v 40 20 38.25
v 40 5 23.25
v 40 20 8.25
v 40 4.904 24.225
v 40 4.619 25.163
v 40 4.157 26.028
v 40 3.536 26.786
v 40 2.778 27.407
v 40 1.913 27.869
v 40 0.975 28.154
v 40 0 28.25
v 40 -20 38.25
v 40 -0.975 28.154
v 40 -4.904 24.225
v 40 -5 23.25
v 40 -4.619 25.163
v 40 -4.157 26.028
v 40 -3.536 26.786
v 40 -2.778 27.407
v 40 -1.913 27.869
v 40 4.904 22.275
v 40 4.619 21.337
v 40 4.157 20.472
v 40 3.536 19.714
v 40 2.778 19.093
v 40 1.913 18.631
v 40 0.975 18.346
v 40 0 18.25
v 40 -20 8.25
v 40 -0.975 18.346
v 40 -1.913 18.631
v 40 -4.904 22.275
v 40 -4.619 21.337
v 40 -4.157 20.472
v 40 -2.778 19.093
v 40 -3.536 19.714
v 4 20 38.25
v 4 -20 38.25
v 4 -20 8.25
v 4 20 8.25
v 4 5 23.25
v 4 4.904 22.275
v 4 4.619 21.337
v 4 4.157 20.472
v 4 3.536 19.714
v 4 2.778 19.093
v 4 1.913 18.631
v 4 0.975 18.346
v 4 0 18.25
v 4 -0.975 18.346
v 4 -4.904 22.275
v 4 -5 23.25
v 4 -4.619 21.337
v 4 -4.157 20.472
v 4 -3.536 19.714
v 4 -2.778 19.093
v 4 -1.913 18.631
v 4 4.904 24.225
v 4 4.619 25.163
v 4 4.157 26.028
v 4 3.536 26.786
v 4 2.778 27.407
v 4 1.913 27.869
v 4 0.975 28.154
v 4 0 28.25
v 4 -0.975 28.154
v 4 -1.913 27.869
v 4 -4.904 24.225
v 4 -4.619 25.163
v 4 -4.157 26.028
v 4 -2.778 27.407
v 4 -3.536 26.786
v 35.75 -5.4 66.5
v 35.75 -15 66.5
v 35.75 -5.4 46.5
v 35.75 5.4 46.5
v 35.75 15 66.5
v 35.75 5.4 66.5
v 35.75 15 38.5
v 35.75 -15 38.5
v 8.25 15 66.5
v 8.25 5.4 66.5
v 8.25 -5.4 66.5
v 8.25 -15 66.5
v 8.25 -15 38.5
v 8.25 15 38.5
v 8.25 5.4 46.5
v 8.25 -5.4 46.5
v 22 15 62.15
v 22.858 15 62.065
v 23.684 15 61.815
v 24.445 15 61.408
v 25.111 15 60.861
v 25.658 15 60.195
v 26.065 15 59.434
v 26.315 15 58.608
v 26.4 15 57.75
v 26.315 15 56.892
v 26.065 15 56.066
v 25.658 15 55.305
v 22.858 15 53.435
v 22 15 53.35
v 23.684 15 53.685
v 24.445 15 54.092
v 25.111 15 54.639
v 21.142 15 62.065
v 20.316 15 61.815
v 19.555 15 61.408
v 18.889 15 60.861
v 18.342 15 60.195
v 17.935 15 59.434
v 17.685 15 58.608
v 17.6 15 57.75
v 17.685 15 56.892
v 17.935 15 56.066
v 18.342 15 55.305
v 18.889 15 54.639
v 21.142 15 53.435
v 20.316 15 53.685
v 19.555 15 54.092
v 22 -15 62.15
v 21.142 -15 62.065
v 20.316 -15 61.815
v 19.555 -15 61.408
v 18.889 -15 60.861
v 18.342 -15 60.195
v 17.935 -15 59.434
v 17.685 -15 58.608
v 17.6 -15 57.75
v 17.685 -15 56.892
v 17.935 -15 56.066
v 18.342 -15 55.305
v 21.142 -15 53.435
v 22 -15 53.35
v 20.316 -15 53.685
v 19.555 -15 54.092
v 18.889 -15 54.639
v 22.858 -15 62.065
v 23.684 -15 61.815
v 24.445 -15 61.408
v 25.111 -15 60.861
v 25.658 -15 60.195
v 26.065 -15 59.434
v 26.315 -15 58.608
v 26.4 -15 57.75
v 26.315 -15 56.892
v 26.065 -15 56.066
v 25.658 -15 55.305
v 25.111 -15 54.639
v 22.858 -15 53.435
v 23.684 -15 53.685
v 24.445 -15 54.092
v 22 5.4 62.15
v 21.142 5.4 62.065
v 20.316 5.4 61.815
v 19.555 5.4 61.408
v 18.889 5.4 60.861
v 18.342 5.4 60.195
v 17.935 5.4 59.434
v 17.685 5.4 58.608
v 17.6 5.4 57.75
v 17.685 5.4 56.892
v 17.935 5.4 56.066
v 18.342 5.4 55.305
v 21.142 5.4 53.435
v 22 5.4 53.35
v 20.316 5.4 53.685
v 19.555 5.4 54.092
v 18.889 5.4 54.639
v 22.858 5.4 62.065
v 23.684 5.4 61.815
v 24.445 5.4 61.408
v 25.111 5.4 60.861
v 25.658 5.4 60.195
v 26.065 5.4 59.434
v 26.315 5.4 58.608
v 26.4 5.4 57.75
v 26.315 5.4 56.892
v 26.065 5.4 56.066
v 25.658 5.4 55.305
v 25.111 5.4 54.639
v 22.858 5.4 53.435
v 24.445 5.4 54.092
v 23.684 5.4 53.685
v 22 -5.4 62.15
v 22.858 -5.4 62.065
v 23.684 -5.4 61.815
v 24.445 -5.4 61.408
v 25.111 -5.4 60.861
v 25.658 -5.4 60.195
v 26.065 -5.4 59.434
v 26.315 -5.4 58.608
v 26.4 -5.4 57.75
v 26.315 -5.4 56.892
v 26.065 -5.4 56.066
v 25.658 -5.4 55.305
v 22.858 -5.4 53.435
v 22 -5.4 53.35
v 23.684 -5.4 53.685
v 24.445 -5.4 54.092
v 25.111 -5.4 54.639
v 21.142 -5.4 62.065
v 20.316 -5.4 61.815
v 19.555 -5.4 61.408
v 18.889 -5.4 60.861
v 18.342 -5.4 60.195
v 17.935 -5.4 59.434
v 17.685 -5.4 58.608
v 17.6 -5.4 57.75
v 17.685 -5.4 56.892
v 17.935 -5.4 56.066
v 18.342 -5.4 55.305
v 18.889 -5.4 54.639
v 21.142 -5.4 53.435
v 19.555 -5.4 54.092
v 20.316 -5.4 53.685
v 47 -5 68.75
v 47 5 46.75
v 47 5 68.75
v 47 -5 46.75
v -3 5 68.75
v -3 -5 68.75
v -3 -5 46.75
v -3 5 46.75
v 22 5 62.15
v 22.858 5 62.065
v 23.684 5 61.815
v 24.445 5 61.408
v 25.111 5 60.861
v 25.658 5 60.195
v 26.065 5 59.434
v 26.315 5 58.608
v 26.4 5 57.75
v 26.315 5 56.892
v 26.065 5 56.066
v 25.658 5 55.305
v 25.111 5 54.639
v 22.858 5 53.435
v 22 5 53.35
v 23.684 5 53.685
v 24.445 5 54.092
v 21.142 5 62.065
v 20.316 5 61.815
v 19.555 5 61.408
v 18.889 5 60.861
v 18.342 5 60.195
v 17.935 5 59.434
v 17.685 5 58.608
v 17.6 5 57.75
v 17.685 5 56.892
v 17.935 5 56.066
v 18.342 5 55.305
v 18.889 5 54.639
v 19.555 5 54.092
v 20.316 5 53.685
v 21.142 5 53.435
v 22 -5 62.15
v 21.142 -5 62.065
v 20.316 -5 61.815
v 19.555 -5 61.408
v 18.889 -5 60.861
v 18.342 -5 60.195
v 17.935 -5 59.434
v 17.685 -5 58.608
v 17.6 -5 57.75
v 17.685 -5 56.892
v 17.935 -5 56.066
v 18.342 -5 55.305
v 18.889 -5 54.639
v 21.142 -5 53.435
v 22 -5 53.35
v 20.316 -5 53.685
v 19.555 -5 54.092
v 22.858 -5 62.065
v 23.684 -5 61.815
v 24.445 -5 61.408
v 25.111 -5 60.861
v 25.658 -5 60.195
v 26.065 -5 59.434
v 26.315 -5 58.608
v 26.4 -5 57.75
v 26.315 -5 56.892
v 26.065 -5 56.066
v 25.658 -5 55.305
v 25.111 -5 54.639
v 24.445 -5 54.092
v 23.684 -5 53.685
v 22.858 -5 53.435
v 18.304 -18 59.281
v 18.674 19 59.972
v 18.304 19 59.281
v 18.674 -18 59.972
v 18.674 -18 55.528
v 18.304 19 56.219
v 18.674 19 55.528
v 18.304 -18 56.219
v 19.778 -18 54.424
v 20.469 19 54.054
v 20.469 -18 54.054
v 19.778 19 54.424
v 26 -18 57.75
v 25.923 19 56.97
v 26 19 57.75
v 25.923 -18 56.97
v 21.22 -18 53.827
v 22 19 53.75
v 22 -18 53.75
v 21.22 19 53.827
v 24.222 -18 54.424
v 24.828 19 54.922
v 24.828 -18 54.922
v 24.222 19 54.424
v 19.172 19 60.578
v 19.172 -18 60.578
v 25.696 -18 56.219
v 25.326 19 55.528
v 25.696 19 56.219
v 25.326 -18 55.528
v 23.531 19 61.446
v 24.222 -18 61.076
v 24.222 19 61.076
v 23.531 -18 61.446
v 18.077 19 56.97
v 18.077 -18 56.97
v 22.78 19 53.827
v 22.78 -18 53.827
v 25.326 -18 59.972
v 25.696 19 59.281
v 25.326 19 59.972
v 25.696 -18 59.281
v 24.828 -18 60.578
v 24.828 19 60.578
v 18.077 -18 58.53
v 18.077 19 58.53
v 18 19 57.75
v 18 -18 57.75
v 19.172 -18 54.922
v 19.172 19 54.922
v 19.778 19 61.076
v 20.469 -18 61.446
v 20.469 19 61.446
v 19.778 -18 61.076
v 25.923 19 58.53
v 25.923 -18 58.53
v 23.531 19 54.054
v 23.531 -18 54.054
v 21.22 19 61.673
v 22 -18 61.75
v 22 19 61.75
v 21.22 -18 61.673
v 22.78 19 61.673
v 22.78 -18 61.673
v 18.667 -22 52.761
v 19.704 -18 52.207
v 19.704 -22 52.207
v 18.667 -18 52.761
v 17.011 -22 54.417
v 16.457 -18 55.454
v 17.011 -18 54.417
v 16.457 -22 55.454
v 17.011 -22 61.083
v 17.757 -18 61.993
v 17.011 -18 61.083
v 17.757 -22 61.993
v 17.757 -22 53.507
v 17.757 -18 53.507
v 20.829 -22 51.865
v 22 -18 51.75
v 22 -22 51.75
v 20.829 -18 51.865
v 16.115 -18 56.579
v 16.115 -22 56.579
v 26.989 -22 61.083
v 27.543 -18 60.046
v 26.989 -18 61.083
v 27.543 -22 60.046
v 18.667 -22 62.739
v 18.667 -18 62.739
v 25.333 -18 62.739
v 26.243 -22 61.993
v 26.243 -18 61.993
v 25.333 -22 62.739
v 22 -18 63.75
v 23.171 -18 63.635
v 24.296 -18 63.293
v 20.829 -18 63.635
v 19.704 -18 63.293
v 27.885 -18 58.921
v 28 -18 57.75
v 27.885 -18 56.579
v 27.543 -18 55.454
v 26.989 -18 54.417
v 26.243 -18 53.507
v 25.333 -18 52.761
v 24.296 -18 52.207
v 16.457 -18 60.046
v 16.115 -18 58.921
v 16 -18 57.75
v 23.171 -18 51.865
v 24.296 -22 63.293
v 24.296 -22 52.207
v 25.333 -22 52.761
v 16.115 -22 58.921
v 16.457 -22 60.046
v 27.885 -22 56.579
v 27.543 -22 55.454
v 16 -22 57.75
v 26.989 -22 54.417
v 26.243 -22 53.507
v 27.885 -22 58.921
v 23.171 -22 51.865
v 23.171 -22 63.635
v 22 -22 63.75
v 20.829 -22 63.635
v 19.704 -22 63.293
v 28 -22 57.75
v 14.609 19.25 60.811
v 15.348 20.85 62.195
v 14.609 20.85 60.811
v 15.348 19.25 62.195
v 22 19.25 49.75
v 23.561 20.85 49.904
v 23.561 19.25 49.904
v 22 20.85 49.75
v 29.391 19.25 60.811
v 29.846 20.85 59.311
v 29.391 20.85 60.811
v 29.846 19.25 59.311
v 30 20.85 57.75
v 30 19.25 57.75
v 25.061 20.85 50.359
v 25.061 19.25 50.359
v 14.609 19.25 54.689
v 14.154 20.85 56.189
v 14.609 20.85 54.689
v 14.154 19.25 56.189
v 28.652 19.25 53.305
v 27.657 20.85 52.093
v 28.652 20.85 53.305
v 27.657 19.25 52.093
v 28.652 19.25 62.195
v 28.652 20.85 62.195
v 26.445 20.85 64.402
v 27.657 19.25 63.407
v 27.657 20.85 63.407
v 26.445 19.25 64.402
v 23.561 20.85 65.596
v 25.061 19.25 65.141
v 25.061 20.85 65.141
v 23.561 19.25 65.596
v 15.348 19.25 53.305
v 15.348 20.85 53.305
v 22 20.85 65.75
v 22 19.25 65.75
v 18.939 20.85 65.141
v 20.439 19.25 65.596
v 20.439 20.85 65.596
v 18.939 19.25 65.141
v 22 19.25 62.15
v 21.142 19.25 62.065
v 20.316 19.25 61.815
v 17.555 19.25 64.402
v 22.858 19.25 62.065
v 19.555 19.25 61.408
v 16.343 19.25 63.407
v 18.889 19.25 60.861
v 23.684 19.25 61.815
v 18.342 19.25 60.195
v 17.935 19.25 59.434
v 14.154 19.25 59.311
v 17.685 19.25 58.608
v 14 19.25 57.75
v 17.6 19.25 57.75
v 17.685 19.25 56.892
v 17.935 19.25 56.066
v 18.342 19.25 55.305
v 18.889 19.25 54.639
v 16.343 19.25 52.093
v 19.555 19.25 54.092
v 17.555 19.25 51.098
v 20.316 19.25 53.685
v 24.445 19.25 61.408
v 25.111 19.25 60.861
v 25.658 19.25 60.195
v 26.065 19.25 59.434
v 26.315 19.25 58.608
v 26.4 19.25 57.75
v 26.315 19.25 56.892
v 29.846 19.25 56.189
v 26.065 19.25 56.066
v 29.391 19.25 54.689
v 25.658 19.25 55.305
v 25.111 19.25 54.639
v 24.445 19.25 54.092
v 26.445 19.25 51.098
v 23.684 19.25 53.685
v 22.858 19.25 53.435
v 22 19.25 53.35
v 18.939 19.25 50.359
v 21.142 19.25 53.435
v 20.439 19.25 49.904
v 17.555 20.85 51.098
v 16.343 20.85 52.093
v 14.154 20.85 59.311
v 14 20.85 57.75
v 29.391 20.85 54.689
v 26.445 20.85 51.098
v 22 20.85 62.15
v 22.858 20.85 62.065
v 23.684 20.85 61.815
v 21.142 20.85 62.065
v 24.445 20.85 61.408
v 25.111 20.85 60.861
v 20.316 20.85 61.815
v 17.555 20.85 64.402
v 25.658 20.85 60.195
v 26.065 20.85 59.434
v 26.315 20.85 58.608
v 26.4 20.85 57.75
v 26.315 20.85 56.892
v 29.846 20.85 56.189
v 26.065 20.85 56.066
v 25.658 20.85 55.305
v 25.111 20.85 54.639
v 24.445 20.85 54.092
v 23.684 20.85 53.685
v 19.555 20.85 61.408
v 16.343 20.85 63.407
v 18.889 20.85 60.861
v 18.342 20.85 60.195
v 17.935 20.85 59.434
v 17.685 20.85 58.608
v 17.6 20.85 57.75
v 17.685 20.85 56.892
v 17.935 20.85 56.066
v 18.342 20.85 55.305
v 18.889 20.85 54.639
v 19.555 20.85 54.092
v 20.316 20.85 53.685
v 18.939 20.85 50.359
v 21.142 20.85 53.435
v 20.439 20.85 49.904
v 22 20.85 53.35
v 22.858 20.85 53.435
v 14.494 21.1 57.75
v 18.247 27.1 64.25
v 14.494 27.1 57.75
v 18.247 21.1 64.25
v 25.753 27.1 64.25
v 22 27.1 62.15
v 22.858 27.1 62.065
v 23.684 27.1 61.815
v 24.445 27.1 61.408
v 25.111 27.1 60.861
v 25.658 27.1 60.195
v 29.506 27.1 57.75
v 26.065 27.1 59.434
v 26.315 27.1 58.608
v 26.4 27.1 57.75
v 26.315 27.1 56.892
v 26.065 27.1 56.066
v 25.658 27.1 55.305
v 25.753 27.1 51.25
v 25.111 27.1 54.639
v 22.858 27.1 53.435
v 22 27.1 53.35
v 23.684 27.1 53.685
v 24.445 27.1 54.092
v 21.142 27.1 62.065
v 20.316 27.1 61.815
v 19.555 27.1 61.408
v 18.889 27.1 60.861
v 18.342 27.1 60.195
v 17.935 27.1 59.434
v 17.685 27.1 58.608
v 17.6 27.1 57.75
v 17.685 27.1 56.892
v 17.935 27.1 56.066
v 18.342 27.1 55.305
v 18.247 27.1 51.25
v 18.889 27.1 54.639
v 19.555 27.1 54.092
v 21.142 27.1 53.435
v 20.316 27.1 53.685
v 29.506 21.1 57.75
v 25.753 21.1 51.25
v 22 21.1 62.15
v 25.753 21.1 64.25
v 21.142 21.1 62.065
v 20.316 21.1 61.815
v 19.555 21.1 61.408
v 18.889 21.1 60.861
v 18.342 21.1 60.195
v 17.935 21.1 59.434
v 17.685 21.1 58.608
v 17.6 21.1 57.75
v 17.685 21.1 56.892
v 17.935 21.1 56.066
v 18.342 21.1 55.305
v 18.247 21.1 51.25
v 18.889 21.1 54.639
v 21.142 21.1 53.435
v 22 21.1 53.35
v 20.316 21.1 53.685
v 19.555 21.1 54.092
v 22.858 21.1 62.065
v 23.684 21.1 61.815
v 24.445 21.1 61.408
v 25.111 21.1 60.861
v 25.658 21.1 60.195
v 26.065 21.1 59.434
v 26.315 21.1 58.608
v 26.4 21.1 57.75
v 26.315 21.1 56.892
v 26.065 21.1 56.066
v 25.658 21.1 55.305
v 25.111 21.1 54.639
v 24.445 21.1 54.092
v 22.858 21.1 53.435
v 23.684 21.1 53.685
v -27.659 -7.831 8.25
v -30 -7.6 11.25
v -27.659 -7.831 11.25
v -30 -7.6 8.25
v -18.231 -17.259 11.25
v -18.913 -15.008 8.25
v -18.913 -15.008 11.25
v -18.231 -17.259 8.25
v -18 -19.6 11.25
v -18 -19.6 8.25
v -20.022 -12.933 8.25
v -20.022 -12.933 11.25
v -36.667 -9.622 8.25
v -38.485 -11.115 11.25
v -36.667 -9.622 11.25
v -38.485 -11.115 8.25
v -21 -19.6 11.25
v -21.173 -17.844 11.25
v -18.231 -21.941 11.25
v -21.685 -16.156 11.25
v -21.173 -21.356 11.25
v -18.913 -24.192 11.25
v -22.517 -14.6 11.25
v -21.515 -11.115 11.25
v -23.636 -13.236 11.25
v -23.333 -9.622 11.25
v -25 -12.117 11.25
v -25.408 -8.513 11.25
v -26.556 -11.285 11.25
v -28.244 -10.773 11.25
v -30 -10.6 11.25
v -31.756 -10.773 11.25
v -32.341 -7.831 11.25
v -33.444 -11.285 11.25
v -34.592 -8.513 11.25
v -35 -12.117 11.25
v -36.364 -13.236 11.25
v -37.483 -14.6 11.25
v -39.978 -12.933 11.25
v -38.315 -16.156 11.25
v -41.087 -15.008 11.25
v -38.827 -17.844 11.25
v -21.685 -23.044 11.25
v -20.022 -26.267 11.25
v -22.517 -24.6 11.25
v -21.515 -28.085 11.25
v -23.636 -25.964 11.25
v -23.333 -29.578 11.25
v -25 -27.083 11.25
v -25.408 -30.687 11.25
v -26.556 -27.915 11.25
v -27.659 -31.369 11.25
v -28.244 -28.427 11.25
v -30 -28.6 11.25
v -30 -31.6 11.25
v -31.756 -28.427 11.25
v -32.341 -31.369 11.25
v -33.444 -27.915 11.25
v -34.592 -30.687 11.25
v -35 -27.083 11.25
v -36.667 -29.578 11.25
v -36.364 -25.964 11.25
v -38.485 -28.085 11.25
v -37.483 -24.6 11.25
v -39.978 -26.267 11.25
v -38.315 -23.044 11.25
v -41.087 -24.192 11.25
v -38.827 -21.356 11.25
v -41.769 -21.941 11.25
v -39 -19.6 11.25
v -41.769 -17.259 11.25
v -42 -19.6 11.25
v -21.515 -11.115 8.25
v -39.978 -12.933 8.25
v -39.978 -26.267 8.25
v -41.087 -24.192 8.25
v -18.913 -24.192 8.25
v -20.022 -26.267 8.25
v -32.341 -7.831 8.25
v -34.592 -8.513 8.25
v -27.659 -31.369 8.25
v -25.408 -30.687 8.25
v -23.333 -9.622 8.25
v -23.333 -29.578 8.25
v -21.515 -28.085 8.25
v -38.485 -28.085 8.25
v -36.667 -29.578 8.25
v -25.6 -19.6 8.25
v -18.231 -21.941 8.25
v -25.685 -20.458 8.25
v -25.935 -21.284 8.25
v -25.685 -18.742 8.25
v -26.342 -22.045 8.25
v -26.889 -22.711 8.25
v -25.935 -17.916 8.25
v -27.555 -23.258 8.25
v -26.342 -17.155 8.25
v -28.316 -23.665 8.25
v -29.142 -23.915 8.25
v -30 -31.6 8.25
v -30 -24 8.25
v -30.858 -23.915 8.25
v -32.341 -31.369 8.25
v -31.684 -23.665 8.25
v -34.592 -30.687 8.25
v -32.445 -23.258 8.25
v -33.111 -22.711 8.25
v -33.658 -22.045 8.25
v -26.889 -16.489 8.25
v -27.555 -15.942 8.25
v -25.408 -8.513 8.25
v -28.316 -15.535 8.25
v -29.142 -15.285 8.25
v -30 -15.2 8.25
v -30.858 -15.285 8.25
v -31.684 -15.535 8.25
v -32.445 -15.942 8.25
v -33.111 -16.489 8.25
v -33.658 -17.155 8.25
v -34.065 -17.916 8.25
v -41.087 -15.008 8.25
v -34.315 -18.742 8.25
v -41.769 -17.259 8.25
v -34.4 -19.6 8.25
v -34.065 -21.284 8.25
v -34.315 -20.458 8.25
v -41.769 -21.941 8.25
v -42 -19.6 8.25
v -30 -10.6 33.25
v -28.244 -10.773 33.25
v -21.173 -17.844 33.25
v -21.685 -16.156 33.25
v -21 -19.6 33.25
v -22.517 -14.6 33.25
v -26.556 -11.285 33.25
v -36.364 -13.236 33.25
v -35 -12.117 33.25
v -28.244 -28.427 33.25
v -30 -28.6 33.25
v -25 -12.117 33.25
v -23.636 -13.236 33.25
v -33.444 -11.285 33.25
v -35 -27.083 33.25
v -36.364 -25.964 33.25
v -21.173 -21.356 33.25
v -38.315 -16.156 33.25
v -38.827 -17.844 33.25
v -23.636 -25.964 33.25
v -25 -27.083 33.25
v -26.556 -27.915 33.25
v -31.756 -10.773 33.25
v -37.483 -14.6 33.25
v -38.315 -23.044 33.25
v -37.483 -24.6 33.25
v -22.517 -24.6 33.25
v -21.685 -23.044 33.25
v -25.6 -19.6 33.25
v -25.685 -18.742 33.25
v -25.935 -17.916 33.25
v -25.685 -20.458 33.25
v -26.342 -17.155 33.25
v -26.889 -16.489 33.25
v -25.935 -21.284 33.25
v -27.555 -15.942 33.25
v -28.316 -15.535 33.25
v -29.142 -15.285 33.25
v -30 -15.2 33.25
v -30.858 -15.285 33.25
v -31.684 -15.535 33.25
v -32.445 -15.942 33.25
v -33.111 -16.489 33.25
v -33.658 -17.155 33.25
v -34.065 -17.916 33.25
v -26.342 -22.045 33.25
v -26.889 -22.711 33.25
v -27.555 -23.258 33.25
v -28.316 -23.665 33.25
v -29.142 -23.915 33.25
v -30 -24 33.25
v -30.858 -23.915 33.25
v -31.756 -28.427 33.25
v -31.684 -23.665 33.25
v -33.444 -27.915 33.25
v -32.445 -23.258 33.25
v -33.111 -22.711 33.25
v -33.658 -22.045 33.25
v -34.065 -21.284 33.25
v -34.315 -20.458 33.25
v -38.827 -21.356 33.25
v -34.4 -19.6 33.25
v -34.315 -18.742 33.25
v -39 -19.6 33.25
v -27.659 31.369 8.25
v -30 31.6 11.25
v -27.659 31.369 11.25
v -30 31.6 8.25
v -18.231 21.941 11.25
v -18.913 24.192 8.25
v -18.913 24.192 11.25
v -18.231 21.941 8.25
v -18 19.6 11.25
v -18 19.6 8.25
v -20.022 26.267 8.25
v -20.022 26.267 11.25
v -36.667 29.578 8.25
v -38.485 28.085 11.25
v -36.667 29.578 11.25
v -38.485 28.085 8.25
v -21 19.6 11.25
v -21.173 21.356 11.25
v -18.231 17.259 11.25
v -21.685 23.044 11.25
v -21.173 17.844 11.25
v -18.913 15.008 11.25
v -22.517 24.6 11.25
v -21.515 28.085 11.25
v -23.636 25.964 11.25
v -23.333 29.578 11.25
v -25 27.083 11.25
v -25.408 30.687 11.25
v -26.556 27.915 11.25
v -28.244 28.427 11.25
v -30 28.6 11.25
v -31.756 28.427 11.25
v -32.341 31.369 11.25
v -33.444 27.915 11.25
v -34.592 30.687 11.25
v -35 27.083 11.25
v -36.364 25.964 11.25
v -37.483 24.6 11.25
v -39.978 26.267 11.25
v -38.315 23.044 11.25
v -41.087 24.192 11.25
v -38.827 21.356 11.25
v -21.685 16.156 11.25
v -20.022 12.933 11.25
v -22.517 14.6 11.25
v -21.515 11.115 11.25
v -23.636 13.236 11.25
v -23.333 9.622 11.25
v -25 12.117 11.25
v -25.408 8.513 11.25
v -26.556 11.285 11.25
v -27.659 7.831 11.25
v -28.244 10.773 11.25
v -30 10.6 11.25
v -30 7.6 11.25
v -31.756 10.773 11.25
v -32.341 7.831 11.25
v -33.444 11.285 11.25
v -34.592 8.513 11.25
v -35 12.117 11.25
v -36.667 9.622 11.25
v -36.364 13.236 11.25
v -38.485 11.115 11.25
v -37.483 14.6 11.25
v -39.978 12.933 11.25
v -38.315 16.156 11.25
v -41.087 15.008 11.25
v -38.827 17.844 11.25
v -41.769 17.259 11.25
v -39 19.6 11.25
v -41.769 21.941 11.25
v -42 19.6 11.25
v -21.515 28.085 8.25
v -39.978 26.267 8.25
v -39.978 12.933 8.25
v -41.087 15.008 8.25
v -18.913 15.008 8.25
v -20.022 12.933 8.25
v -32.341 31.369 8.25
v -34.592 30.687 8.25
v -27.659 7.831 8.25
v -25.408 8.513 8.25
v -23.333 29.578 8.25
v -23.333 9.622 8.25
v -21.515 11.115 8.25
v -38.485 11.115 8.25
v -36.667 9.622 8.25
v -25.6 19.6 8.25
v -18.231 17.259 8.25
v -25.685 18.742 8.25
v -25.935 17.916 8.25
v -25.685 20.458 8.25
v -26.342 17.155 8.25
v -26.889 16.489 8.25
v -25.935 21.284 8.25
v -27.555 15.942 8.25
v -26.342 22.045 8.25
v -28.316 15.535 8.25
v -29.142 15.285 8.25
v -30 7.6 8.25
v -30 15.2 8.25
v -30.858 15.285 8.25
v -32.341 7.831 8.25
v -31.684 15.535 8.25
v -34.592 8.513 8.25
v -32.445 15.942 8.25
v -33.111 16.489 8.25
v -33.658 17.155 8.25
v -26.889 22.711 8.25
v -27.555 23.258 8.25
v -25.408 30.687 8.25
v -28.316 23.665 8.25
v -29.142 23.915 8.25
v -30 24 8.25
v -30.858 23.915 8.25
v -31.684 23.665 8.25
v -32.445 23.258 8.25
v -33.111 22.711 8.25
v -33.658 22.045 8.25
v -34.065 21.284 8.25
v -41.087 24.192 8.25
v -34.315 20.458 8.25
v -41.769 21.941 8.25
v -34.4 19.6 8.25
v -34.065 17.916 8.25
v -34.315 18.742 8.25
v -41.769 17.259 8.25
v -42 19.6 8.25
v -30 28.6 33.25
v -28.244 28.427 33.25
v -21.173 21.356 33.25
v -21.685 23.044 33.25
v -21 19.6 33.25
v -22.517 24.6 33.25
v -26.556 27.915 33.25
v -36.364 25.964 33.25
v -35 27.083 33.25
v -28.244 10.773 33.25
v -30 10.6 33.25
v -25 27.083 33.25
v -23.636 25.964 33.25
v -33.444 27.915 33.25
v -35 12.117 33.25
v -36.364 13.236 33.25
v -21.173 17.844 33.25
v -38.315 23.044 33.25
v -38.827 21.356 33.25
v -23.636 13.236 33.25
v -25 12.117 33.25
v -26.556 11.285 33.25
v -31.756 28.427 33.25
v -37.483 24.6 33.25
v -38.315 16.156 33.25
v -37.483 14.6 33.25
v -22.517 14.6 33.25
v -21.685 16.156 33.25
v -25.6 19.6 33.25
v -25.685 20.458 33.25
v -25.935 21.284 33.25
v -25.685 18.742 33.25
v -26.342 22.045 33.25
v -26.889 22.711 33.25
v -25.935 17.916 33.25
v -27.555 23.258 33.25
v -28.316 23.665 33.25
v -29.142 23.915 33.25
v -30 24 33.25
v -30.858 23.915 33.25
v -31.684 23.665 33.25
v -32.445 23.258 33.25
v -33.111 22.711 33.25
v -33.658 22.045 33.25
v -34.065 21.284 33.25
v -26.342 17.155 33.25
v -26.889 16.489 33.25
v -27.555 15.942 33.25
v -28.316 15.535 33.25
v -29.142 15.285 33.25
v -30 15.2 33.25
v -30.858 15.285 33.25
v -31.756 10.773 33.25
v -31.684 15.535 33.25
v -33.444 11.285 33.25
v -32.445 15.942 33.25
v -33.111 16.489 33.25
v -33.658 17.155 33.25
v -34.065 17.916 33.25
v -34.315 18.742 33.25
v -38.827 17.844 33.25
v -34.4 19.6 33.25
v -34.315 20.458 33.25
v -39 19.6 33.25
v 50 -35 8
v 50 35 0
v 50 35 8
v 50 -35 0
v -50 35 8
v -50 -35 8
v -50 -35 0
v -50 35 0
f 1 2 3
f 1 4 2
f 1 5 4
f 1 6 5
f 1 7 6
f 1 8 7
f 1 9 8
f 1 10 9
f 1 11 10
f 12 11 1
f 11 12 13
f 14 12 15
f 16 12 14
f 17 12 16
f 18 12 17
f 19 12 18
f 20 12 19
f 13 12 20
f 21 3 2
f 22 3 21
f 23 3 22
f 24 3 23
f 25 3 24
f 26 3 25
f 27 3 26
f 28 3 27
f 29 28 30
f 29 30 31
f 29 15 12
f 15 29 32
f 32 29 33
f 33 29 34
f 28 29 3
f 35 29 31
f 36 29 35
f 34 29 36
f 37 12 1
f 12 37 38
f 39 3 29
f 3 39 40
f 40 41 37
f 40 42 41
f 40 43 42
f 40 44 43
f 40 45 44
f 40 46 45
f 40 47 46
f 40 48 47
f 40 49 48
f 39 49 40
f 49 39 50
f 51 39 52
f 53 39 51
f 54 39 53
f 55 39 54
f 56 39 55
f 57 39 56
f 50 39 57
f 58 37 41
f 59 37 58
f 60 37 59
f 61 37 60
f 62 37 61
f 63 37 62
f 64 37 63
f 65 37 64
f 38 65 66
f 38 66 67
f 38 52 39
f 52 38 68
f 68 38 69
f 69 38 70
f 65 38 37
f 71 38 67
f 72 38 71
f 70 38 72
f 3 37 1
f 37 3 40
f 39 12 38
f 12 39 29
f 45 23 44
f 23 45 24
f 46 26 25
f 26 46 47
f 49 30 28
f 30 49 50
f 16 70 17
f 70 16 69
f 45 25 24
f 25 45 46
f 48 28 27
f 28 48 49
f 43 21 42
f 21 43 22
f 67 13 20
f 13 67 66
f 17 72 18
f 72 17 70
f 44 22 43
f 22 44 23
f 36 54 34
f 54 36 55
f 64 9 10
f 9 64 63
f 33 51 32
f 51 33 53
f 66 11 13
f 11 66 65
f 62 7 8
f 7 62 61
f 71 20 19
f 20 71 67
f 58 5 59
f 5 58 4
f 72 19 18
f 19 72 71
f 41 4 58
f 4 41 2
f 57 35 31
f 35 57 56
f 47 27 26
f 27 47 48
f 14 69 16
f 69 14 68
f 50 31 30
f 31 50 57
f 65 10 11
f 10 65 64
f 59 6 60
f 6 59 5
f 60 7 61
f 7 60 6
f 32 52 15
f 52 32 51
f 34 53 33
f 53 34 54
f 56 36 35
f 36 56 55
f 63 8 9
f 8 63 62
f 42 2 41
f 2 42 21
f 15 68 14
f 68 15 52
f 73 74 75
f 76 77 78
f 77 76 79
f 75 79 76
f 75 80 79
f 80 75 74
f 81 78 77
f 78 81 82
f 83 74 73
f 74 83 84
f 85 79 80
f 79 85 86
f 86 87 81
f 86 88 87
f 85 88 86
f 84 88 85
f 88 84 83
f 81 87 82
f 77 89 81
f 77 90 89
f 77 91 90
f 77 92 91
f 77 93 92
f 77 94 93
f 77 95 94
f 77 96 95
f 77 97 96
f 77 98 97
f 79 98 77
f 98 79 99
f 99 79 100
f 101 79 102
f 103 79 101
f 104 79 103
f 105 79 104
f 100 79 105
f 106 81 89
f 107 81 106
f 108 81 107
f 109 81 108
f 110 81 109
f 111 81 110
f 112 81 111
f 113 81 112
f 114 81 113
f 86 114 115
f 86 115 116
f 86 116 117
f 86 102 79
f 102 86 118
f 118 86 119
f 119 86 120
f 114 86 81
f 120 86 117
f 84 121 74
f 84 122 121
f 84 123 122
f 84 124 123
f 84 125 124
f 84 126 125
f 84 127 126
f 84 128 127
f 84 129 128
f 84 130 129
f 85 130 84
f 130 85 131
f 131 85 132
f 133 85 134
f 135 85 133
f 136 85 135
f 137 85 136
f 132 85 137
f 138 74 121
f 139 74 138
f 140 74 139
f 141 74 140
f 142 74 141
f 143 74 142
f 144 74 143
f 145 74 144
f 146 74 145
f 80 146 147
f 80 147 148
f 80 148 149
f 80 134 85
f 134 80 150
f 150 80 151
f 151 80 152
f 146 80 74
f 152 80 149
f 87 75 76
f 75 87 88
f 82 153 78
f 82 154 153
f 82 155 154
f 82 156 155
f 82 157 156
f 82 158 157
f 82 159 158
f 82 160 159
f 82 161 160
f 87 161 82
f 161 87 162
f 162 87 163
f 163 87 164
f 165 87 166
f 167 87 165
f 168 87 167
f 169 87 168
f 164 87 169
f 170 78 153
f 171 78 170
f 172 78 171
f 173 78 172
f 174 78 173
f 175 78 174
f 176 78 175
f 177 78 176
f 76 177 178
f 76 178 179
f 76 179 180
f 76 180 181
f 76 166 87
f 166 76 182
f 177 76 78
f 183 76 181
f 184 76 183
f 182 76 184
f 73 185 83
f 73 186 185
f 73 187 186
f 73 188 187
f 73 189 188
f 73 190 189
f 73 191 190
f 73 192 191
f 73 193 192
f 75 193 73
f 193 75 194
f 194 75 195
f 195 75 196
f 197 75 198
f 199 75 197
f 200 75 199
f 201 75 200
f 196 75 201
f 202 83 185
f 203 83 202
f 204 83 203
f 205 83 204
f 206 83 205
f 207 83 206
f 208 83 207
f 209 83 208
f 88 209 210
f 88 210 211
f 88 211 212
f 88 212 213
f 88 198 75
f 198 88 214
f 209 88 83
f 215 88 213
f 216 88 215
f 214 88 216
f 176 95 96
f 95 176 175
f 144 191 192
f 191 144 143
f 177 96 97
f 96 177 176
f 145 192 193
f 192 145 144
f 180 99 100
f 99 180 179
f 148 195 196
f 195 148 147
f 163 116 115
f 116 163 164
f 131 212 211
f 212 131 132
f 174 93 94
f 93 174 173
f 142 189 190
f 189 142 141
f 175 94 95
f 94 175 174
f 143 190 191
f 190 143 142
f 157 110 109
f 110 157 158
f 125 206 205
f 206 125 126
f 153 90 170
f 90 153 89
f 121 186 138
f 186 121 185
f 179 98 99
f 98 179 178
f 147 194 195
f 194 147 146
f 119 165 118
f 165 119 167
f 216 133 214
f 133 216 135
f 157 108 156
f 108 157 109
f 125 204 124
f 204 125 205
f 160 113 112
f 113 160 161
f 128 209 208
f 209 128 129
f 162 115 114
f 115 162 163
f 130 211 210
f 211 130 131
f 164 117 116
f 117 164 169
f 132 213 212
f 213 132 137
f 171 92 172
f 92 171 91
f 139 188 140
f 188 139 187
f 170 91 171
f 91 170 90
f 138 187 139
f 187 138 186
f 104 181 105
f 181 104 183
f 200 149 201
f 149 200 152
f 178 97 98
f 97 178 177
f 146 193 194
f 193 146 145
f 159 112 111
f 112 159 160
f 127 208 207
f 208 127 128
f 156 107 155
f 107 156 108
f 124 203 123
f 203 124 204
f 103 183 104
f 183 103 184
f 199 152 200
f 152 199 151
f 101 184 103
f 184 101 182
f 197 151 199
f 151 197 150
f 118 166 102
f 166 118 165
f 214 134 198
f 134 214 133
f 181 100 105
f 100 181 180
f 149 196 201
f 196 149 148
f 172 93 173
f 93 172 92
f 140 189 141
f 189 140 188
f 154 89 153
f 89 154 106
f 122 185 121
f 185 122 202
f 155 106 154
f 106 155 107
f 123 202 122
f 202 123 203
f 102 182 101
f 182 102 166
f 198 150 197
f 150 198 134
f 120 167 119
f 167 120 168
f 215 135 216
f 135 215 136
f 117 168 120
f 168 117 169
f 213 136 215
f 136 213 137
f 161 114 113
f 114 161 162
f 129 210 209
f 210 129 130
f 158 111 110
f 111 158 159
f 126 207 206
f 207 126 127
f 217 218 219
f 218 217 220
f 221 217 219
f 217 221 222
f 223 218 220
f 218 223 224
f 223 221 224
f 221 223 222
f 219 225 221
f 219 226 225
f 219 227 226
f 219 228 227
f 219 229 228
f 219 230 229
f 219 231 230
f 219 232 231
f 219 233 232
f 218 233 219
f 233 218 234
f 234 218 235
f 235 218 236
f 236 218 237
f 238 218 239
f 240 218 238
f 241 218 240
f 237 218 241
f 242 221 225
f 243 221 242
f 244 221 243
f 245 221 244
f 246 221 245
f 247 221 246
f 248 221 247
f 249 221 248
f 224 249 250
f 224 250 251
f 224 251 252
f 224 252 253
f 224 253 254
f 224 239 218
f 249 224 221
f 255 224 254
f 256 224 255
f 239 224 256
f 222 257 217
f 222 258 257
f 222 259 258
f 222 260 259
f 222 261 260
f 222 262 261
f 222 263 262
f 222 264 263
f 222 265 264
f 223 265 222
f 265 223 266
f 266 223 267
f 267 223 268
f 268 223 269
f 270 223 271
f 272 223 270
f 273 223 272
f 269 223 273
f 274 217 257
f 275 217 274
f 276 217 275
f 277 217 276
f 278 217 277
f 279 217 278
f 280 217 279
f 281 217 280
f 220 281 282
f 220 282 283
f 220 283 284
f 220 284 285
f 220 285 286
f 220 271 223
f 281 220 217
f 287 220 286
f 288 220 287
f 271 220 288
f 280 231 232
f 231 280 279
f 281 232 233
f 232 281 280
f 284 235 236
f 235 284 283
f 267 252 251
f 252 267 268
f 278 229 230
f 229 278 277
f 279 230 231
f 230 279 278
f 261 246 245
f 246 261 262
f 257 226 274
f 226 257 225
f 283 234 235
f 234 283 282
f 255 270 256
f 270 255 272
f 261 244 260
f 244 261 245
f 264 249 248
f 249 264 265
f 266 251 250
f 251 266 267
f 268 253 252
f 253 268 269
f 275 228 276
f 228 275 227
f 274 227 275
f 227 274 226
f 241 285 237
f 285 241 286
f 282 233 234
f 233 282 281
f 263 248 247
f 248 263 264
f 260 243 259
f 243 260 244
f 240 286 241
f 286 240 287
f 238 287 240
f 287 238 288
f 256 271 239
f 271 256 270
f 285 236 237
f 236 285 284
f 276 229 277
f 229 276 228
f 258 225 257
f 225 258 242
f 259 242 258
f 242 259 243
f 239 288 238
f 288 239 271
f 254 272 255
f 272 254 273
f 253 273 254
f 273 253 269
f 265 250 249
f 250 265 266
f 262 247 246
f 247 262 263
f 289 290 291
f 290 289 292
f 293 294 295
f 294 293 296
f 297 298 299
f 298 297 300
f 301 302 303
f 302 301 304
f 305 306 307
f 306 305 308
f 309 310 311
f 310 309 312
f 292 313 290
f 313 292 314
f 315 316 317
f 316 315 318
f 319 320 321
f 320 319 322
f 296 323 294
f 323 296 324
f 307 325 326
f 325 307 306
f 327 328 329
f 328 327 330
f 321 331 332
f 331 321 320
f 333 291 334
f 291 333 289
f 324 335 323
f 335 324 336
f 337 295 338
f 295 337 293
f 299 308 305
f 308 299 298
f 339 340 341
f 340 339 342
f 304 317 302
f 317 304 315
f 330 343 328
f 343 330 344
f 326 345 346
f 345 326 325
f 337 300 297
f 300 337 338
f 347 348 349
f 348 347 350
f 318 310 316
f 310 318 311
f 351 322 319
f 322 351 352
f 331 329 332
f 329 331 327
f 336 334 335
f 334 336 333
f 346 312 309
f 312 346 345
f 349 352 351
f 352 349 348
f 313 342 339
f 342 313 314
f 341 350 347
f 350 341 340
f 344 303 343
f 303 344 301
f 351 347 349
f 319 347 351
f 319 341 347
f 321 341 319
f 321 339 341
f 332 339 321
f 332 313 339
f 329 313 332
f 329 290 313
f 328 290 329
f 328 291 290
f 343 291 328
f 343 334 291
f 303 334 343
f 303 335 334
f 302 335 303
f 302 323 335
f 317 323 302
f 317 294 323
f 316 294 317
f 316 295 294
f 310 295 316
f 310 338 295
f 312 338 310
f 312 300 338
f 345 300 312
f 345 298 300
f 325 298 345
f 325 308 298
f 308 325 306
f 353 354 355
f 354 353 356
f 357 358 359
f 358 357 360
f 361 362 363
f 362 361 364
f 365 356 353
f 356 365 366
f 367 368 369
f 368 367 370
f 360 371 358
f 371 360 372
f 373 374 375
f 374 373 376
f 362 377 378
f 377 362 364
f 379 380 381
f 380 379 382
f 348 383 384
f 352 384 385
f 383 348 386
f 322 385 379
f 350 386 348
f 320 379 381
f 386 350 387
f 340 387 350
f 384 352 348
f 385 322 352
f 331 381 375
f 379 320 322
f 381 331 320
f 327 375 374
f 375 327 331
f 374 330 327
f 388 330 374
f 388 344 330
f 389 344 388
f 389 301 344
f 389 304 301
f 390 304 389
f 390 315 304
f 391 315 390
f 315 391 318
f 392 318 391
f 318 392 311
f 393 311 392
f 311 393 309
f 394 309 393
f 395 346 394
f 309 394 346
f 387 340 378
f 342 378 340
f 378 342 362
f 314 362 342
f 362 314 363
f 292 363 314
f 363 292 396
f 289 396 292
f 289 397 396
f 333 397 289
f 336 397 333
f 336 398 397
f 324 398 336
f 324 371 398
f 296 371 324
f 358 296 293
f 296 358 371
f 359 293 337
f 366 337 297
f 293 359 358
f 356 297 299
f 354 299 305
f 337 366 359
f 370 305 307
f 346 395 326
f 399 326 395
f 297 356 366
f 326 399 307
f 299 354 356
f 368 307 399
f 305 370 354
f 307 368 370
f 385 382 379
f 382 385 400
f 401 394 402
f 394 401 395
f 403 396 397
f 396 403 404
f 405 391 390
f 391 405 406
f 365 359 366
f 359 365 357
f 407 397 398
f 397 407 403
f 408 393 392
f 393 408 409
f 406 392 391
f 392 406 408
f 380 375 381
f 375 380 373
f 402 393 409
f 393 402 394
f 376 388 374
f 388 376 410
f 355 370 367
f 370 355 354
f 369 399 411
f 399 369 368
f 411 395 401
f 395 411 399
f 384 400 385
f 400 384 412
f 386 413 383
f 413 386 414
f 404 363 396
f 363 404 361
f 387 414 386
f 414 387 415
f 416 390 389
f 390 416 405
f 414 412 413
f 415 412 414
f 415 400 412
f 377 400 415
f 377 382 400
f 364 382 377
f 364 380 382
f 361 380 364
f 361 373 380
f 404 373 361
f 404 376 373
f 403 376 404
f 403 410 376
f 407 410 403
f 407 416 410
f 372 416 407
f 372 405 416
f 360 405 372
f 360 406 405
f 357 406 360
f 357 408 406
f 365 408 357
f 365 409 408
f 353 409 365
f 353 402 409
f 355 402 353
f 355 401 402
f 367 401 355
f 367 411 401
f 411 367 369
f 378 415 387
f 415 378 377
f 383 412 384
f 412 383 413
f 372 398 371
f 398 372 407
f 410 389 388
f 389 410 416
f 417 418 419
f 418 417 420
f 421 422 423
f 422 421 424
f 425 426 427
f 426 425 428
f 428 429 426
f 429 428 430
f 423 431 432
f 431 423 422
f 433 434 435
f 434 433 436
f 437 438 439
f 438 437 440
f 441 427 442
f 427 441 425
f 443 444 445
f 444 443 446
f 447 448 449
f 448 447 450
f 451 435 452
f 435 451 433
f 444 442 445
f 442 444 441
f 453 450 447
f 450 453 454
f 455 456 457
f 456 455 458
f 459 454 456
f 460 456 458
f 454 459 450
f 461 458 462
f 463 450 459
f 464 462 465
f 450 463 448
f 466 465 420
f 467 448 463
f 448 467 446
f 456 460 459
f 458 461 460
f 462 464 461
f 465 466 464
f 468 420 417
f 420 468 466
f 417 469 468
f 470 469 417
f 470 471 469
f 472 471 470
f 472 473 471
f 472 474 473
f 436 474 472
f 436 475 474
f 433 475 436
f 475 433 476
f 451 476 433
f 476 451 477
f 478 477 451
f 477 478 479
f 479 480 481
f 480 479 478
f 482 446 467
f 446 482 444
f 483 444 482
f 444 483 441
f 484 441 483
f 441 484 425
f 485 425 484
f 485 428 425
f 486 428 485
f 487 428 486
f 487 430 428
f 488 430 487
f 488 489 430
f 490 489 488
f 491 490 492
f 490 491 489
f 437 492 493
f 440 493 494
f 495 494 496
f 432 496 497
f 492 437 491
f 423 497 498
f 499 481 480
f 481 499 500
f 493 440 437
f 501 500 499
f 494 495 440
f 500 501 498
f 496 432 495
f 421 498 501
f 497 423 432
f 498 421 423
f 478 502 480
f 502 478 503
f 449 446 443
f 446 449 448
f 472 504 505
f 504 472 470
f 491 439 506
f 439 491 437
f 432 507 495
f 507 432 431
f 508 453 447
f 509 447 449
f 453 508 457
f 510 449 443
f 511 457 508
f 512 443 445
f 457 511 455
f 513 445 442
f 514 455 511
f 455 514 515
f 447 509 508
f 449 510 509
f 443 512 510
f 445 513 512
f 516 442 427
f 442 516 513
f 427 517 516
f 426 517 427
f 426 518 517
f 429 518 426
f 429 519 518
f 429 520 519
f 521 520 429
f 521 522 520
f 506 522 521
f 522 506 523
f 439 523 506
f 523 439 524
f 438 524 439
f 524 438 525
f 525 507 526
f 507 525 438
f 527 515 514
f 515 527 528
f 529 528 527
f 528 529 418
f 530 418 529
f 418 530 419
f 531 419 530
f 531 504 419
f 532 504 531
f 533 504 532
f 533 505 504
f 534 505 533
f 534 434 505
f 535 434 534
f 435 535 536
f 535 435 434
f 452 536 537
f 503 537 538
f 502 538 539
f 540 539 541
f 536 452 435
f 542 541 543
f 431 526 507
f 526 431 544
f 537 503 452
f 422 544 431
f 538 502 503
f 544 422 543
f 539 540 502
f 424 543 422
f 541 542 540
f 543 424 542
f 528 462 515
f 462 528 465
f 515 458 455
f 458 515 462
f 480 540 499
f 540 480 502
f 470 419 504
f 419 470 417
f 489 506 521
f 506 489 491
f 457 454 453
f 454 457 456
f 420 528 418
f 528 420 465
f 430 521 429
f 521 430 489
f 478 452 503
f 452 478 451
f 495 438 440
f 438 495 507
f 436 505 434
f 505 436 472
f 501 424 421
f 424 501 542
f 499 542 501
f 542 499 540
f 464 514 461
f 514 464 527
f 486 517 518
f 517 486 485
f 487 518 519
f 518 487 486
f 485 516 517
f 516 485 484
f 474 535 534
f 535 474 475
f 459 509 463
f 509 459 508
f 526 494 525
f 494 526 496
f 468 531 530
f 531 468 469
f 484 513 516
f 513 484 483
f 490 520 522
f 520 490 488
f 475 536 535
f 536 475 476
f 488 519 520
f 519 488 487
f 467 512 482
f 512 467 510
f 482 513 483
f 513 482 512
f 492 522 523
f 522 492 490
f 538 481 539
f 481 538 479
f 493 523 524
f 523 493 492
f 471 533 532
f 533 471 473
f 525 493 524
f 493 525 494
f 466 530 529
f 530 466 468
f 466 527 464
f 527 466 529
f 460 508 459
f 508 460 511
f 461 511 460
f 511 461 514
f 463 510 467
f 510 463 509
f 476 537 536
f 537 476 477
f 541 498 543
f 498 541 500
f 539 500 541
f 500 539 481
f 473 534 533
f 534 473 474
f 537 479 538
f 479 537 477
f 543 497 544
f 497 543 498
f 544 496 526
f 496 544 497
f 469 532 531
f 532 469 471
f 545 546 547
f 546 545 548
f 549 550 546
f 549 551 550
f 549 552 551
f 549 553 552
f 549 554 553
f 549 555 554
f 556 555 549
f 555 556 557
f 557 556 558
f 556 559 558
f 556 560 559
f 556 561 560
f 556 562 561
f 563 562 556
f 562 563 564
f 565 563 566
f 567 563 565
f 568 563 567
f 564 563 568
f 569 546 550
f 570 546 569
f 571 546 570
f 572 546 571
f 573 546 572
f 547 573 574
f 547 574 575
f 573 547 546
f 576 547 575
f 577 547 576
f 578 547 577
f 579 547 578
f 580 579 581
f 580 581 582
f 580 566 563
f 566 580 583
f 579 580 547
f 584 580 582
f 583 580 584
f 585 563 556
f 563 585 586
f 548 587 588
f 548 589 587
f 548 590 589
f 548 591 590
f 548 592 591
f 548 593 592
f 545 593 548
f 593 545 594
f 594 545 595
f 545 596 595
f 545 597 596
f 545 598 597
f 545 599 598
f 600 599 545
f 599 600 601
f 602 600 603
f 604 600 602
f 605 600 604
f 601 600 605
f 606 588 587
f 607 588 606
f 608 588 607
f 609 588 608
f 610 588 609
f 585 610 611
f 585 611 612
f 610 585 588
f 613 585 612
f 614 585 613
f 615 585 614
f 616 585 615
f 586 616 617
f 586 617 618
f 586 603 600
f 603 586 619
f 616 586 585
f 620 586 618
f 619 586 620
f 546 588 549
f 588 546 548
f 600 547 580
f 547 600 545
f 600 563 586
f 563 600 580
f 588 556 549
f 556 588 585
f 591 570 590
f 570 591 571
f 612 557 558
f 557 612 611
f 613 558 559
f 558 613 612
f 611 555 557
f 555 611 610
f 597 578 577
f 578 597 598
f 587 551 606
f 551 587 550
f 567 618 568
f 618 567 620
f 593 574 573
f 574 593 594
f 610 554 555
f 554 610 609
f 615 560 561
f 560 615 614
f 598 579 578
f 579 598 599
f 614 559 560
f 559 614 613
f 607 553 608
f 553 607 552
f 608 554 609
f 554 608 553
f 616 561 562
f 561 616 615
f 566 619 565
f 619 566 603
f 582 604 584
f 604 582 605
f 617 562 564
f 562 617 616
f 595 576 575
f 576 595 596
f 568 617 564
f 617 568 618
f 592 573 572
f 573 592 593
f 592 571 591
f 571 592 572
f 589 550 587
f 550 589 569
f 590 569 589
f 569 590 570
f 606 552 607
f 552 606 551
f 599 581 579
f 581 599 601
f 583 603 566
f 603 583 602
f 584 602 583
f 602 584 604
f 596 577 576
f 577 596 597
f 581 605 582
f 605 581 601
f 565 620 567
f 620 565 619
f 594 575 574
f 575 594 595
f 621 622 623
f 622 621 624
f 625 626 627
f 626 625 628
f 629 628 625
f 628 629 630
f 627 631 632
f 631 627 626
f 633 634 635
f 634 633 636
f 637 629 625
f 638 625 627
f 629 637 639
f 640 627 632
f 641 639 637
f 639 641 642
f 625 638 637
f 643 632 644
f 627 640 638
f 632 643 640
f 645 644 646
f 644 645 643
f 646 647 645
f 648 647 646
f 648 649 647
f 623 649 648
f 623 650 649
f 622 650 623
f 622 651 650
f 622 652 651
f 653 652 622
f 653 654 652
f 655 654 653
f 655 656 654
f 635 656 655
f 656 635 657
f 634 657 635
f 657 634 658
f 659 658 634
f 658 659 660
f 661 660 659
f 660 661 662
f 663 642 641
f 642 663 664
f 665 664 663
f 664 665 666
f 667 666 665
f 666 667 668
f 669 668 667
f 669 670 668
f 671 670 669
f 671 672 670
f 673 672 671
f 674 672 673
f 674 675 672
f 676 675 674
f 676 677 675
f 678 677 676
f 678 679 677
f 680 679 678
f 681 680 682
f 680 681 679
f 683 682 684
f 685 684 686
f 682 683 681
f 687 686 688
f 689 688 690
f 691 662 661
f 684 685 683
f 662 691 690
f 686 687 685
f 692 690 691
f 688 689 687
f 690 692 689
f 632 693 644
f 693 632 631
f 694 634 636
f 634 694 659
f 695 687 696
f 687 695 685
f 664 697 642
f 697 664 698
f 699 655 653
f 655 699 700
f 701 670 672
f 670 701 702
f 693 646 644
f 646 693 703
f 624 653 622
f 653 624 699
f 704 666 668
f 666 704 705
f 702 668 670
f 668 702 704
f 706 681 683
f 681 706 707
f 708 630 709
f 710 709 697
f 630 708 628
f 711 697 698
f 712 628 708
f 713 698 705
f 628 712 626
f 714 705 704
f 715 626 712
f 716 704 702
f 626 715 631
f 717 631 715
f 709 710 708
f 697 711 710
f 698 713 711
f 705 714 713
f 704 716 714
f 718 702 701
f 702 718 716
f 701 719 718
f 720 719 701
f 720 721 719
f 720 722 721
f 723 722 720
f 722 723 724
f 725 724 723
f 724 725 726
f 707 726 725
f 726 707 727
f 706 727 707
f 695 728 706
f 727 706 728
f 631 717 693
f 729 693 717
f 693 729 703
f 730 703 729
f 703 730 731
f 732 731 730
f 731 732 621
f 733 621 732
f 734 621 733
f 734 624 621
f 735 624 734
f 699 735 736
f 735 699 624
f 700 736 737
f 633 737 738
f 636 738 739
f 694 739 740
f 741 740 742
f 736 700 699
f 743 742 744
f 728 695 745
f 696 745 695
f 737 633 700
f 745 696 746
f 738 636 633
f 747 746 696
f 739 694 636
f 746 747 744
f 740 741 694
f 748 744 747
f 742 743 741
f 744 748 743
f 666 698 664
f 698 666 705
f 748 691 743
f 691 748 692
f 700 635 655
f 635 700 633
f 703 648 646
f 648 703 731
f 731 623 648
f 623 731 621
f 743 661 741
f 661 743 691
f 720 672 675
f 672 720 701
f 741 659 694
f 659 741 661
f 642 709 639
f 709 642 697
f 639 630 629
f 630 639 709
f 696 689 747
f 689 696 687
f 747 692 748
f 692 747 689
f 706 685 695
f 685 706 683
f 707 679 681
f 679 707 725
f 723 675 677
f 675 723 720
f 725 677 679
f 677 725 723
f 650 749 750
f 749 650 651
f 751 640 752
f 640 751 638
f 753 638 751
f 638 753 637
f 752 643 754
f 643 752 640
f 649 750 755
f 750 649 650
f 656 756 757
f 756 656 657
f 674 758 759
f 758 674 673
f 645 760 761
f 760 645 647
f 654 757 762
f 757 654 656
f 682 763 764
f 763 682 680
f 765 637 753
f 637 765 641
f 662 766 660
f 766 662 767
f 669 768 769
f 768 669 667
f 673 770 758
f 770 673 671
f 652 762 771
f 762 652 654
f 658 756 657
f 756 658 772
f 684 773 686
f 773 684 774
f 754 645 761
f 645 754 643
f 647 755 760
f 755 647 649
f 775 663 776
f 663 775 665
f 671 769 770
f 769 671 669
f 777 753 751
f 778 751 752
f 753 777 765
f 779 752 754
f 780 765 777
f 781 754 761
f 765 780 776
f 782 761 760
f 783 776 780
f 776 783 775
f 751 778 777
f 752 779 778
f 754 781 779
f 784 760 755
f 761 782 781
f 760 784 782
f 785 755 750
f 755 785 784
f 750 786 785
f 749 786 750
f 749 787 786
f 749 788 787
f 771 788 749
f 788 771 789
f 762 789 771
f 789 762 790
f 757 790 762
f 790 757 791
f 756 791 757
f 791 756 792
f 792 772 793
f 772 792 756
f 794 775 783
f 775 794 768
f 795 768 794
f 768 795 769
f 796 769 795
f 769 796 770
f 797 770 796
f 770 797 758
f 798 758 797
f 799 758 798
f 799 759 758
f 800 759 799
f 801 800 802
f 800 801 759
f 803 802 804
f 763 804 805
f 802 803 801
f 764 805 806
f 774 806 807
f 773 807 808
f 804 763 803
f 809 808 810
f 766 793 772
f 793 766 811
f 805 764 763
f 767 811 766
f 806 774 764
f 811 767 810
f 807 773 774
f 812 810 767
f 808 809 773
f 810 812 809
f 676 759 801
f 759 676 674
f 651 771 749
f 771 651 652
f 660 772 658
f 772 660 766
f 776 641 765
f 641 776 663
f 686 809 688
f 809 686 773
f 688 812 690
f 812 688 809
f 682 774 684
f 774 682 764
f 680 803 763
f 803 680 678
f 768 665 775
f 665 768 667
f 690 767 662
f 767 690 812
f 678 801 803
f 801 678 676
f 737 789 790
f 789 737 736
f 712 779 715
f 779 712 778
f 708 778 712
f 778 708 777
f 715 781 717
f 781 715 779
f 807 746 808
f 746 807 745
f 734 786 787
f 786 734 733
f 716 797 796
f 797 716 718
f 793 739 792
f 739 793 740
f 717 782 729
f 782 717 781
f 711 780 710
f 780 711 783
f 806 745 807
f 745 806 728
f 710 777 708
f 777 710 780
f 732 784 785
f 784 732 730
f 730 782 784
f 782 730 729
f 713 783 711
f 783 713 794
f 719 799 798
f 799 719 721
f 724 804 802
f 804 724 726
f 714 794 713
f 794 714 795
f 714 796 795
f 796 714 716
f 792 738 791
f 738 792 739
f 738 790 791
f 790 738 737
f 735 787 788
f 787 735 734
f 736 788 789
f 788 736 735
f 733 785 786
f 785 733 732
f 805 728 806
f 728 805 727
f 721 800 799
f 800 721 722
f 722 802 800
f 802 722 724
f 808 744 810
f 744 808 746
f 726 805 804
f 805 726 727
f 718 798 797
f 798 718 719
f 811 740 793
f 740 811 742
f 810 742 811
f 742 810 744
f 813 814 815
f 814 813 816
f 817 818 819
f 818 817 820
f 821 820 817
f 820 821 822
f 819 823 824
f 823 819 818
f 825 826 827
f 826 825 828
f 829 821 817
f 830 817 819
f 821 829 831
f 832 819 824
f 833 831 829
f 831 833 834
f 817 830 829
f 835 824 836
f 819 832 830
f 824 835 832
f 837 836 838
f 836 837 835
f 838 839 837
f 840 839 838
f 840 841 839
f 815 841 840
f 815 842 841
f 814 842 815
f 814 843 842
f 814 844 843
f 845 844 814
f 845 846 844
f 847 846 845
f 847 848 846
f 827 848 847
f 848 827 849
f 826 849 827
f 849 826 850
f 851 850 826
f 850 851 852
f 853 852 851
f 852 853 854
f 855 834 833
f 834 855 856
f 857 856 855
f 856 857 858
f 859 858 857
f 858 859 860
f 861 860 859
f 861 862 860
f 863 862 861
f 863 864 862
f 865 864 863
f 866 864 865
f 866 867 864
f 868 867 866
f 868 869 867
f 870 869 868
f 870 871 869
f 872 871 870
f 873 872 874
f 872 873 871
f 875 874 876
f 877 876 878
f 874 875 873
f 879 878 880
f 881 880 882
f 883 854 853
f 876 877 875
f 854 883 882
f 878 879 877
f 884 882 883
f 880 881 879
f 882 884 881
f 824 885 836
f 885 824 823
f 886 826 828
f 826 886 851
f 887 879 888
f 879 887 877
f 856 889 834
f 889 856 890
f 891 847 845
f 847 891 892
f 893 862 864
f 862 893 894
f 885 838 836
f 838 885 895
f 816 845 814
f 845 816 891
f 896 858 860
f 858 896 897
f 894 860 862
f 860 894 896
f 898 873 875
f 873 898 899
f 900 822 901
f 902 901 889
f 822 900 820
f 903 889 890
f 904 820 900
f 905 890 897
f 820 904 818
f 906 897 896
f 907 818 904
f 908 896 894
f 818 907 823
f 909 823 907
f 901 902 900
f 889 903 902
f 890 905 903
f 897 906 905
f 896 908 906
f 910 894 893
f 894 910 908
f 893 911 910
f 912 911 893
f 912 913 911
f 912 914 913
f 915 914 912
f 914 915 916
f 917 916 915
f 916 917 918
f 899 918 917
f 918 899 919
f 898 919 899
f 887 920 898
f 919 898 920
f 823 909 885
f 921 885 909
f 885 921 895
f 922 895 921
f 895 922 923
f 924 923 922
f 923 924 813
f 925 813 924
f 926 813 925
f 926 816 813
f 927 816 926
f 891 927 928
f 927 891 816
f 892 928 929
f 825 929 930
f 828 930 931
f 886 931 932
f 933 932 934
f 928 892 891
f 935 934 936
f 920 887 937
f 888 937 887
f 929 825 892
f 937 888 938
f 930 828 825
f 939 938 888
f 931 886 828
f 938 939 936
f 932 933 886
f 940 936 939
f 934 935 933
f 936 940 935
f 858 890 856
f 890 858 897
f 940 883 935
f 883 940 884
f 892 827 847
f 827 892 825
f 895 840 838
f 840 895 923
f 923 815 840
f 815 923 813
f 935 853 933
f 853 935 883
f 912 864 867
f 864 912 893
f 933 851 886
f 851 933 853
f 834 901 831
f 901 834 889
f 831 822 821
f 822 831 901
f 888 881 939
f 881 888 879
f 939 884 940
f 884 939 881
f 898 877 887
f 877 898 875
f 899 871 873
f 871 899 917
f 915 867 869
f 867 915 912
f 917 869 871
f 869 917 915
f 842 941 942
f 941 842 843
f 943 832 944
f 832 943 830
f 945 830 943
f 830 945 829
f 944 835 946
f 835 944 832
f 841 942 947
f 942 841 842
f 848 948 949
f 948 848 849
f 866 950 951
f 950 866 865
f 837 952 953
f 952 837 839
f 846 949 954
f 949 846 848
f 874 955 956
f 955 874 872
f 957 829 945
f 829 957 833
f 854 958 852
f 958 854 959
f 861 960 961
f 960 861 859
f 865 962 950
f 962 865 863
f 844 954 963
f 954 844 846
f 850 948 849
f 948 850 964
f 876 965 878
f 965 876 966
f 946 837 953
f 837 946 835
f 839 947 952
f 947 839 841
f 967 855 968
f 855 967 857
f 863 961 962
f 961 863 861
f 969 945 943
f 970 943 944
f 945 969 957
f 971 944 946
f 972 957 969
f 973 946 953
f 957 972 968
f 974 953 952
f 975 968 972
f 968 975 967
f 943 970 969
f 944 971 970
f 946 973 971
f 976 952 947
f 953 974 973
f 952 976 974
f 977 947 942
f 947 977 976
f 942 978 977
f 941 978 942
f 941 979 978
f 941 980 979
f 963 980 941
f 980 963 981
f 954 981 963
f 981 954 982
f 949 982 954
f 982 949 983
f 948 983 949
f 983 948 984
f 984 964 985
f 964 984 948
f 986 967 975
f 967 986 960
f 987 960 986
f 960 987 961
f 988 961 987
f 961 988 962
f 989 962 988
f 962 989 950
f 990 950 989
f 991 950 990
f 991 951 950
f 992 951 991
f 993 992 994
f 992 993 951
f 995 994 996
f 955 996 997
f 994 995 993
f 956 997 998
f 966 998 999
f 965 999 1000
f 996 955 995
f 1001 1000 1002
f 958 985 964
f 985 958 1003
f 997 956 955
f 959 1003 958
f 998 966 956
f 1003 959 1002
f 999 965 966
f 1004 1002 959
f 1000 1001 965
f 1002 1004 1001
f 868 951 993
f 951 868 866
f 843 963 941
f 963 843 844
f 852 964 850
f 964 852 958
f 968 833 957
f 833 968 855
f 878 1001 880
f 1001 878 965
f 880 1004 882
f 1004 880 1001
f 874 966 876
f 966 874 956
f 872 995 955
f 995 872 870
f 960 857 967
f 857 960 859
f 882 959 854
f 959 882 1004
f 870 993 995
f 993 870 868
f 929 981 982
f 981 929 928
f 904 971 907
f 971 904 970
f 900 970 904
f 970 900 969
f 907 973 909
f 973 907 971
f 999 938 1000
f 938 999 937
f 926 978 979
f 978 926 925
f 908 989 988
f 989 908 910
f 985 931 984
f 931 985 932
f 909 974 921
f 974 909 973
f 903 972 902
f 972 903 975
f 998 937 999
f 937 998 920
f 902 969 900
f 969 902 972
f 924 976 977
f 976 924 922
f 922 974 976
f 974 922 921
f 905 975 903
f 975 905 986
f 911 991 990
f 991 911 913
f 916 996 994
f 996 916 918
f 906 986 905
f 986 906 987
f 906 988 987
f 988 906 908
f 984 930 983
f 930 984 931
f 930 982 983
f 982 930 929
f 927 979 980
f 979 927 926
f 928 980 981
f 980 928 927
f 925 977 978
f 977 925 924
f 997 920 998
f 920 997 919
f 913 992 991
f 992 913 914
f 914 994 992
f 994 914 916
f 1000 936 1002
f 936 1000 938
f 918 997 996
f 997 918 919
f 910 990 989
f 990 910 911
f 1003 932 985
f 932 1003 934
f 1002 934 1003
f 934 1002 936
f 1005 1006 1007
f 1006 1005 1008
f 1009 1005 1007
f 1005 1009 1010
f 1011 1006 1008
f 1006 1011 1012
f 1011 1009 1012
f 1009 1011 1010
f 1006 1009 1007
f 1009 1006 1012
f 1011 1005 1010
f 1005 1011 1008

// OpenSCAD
$fn = 32;

// ------------------------------------------------------------------------
// Indexing jig: plate 100 x 70 mm, pin d8
// Every part is its own module, assembly() places every instance.
// ------------------------------------------------------------------------

// --- part 1 ---
module jig_plate() {
  difference() {
    translate([-50, -35, 0]) cube([100, 70, 8]);
  }
}

// --- part 2 ---
module locator_block() {
  difference() {
    translate([-18, -20, 0]) cube([36, 40, 30]);
    translate([0, 0, 15]) rotate([0, 90, 0]) cylinder(h = 38, d = 10, center = true);
  }
}

// --- part 3 ---
module index_fork() {
  difference() {
    translate([-13.75, -15, 0]) cube([27.5, 30, 28]);
    translate([-14.75, -5.4, 8]) cube([29.5, 10.8, 21]);
    translate([0, 0, 19.25]) rotate([90, 0, 0]) cylinder(h = 32, d = 8.8, center = true);
  }
}

// --- part 4 ---
module index_arm() {
  difference() {
    translate([-25, -5, 0]) cube([50, 10, 22]);
    translate([0, 0, 11]) rotate([90, 0, 0]) cylinder(h = 12, d = 8.8, center = true);
  }
}

// --- part 5 ---
module index_pin() {
  rotate([0, 90, 0]) cylinder(h = 38, d = 8, center = true);
  translate([-22, 0, 0]) rotate([0, 90, 0]) cylinder(h = 4, d = 12);
}

// --- part 6 ---
module pin_washer() {
  difference() {
      translate([0, 0, 0]) cylinder(h = 1.6, d = 16);
      translate([0, 0, -1]) cylinder(h = 3.6, d = 8.8);
    }
}

// --- part 7 ---
module lock_nut() {
  difference() {
    linear_extrude(height = 6) polygon(points = [[7.506, 0], [3.753, 6.5], [-3.753, 6.5], [-7.506, 0], [-3.753, -6.5], [3.753, -6.5]]);
    translate([0, 0, -1]) cylinder(h = 8, d = 8.8);
  }
}

// --- part 8 ---
module guide_bush_a() {
  difference() {
    union() {
      cylinder(h = 3, d = 24);
      translate([0, 0, 3]) cylinder(h = 22, d = 18);
    }
    translate([0, 0, -1]) cylinder(h = 27, d = 8.8);
  }
}

// --- part 9 ---
module guide_bush_b() {
  difference() {
    union() {
      cylinder(h = 3, d = 24);
      translate([0, 0, 3]) cylinder(h = 22, d = 18);
    }
    translate([0, 0, -1]) cylinder(h = 27, d = 8.8);
  }
}

// --- assembly ---
module assembly() {
  color([0.80, 0.24, 0.20]) translate([0, 0, 0]) rotate([0, 0, 0]) jig_plate();
  color([0.20, 0.45, 0.75]) translate([22, 0, 8.25]) rotate([0, 0, 0]) locator_block();
  color([0.25, 0.62, 0.32]) translate([22, 0, 38.5]) rotate([0, 0, 0]) index_fork();
  color([0.92, 0.70, 0.18]) translate([22, 0, 46.75]) rotate([0, 0, 0]) index_arm();
  color([0.58, 0.35, 0.70]) translate([22, 0, 57.75]) rotate([0, 0, 90]) index_pin();
  color([0.16, 0.66, 0.66]) translate([22, 20.85, 57.75]) rotate([90, 0, 0]) pin_washer();
  color([0.85, 0.48, 0.18]) translate([22, 27.1, 57.75]) rotate([90, 0, 0]) lock_nut();
  color([0.55, 0.60, 0.65]) translate([-30, -19.6, 8.25]) rotate([0, 0, 0]) guide_bush_a();
  color([0.75, 0.30, 0.55]) translate([-30, 19.6, 8.25]) rotate([0, 0, 0]) guide_bush_b();
}

assembly();
